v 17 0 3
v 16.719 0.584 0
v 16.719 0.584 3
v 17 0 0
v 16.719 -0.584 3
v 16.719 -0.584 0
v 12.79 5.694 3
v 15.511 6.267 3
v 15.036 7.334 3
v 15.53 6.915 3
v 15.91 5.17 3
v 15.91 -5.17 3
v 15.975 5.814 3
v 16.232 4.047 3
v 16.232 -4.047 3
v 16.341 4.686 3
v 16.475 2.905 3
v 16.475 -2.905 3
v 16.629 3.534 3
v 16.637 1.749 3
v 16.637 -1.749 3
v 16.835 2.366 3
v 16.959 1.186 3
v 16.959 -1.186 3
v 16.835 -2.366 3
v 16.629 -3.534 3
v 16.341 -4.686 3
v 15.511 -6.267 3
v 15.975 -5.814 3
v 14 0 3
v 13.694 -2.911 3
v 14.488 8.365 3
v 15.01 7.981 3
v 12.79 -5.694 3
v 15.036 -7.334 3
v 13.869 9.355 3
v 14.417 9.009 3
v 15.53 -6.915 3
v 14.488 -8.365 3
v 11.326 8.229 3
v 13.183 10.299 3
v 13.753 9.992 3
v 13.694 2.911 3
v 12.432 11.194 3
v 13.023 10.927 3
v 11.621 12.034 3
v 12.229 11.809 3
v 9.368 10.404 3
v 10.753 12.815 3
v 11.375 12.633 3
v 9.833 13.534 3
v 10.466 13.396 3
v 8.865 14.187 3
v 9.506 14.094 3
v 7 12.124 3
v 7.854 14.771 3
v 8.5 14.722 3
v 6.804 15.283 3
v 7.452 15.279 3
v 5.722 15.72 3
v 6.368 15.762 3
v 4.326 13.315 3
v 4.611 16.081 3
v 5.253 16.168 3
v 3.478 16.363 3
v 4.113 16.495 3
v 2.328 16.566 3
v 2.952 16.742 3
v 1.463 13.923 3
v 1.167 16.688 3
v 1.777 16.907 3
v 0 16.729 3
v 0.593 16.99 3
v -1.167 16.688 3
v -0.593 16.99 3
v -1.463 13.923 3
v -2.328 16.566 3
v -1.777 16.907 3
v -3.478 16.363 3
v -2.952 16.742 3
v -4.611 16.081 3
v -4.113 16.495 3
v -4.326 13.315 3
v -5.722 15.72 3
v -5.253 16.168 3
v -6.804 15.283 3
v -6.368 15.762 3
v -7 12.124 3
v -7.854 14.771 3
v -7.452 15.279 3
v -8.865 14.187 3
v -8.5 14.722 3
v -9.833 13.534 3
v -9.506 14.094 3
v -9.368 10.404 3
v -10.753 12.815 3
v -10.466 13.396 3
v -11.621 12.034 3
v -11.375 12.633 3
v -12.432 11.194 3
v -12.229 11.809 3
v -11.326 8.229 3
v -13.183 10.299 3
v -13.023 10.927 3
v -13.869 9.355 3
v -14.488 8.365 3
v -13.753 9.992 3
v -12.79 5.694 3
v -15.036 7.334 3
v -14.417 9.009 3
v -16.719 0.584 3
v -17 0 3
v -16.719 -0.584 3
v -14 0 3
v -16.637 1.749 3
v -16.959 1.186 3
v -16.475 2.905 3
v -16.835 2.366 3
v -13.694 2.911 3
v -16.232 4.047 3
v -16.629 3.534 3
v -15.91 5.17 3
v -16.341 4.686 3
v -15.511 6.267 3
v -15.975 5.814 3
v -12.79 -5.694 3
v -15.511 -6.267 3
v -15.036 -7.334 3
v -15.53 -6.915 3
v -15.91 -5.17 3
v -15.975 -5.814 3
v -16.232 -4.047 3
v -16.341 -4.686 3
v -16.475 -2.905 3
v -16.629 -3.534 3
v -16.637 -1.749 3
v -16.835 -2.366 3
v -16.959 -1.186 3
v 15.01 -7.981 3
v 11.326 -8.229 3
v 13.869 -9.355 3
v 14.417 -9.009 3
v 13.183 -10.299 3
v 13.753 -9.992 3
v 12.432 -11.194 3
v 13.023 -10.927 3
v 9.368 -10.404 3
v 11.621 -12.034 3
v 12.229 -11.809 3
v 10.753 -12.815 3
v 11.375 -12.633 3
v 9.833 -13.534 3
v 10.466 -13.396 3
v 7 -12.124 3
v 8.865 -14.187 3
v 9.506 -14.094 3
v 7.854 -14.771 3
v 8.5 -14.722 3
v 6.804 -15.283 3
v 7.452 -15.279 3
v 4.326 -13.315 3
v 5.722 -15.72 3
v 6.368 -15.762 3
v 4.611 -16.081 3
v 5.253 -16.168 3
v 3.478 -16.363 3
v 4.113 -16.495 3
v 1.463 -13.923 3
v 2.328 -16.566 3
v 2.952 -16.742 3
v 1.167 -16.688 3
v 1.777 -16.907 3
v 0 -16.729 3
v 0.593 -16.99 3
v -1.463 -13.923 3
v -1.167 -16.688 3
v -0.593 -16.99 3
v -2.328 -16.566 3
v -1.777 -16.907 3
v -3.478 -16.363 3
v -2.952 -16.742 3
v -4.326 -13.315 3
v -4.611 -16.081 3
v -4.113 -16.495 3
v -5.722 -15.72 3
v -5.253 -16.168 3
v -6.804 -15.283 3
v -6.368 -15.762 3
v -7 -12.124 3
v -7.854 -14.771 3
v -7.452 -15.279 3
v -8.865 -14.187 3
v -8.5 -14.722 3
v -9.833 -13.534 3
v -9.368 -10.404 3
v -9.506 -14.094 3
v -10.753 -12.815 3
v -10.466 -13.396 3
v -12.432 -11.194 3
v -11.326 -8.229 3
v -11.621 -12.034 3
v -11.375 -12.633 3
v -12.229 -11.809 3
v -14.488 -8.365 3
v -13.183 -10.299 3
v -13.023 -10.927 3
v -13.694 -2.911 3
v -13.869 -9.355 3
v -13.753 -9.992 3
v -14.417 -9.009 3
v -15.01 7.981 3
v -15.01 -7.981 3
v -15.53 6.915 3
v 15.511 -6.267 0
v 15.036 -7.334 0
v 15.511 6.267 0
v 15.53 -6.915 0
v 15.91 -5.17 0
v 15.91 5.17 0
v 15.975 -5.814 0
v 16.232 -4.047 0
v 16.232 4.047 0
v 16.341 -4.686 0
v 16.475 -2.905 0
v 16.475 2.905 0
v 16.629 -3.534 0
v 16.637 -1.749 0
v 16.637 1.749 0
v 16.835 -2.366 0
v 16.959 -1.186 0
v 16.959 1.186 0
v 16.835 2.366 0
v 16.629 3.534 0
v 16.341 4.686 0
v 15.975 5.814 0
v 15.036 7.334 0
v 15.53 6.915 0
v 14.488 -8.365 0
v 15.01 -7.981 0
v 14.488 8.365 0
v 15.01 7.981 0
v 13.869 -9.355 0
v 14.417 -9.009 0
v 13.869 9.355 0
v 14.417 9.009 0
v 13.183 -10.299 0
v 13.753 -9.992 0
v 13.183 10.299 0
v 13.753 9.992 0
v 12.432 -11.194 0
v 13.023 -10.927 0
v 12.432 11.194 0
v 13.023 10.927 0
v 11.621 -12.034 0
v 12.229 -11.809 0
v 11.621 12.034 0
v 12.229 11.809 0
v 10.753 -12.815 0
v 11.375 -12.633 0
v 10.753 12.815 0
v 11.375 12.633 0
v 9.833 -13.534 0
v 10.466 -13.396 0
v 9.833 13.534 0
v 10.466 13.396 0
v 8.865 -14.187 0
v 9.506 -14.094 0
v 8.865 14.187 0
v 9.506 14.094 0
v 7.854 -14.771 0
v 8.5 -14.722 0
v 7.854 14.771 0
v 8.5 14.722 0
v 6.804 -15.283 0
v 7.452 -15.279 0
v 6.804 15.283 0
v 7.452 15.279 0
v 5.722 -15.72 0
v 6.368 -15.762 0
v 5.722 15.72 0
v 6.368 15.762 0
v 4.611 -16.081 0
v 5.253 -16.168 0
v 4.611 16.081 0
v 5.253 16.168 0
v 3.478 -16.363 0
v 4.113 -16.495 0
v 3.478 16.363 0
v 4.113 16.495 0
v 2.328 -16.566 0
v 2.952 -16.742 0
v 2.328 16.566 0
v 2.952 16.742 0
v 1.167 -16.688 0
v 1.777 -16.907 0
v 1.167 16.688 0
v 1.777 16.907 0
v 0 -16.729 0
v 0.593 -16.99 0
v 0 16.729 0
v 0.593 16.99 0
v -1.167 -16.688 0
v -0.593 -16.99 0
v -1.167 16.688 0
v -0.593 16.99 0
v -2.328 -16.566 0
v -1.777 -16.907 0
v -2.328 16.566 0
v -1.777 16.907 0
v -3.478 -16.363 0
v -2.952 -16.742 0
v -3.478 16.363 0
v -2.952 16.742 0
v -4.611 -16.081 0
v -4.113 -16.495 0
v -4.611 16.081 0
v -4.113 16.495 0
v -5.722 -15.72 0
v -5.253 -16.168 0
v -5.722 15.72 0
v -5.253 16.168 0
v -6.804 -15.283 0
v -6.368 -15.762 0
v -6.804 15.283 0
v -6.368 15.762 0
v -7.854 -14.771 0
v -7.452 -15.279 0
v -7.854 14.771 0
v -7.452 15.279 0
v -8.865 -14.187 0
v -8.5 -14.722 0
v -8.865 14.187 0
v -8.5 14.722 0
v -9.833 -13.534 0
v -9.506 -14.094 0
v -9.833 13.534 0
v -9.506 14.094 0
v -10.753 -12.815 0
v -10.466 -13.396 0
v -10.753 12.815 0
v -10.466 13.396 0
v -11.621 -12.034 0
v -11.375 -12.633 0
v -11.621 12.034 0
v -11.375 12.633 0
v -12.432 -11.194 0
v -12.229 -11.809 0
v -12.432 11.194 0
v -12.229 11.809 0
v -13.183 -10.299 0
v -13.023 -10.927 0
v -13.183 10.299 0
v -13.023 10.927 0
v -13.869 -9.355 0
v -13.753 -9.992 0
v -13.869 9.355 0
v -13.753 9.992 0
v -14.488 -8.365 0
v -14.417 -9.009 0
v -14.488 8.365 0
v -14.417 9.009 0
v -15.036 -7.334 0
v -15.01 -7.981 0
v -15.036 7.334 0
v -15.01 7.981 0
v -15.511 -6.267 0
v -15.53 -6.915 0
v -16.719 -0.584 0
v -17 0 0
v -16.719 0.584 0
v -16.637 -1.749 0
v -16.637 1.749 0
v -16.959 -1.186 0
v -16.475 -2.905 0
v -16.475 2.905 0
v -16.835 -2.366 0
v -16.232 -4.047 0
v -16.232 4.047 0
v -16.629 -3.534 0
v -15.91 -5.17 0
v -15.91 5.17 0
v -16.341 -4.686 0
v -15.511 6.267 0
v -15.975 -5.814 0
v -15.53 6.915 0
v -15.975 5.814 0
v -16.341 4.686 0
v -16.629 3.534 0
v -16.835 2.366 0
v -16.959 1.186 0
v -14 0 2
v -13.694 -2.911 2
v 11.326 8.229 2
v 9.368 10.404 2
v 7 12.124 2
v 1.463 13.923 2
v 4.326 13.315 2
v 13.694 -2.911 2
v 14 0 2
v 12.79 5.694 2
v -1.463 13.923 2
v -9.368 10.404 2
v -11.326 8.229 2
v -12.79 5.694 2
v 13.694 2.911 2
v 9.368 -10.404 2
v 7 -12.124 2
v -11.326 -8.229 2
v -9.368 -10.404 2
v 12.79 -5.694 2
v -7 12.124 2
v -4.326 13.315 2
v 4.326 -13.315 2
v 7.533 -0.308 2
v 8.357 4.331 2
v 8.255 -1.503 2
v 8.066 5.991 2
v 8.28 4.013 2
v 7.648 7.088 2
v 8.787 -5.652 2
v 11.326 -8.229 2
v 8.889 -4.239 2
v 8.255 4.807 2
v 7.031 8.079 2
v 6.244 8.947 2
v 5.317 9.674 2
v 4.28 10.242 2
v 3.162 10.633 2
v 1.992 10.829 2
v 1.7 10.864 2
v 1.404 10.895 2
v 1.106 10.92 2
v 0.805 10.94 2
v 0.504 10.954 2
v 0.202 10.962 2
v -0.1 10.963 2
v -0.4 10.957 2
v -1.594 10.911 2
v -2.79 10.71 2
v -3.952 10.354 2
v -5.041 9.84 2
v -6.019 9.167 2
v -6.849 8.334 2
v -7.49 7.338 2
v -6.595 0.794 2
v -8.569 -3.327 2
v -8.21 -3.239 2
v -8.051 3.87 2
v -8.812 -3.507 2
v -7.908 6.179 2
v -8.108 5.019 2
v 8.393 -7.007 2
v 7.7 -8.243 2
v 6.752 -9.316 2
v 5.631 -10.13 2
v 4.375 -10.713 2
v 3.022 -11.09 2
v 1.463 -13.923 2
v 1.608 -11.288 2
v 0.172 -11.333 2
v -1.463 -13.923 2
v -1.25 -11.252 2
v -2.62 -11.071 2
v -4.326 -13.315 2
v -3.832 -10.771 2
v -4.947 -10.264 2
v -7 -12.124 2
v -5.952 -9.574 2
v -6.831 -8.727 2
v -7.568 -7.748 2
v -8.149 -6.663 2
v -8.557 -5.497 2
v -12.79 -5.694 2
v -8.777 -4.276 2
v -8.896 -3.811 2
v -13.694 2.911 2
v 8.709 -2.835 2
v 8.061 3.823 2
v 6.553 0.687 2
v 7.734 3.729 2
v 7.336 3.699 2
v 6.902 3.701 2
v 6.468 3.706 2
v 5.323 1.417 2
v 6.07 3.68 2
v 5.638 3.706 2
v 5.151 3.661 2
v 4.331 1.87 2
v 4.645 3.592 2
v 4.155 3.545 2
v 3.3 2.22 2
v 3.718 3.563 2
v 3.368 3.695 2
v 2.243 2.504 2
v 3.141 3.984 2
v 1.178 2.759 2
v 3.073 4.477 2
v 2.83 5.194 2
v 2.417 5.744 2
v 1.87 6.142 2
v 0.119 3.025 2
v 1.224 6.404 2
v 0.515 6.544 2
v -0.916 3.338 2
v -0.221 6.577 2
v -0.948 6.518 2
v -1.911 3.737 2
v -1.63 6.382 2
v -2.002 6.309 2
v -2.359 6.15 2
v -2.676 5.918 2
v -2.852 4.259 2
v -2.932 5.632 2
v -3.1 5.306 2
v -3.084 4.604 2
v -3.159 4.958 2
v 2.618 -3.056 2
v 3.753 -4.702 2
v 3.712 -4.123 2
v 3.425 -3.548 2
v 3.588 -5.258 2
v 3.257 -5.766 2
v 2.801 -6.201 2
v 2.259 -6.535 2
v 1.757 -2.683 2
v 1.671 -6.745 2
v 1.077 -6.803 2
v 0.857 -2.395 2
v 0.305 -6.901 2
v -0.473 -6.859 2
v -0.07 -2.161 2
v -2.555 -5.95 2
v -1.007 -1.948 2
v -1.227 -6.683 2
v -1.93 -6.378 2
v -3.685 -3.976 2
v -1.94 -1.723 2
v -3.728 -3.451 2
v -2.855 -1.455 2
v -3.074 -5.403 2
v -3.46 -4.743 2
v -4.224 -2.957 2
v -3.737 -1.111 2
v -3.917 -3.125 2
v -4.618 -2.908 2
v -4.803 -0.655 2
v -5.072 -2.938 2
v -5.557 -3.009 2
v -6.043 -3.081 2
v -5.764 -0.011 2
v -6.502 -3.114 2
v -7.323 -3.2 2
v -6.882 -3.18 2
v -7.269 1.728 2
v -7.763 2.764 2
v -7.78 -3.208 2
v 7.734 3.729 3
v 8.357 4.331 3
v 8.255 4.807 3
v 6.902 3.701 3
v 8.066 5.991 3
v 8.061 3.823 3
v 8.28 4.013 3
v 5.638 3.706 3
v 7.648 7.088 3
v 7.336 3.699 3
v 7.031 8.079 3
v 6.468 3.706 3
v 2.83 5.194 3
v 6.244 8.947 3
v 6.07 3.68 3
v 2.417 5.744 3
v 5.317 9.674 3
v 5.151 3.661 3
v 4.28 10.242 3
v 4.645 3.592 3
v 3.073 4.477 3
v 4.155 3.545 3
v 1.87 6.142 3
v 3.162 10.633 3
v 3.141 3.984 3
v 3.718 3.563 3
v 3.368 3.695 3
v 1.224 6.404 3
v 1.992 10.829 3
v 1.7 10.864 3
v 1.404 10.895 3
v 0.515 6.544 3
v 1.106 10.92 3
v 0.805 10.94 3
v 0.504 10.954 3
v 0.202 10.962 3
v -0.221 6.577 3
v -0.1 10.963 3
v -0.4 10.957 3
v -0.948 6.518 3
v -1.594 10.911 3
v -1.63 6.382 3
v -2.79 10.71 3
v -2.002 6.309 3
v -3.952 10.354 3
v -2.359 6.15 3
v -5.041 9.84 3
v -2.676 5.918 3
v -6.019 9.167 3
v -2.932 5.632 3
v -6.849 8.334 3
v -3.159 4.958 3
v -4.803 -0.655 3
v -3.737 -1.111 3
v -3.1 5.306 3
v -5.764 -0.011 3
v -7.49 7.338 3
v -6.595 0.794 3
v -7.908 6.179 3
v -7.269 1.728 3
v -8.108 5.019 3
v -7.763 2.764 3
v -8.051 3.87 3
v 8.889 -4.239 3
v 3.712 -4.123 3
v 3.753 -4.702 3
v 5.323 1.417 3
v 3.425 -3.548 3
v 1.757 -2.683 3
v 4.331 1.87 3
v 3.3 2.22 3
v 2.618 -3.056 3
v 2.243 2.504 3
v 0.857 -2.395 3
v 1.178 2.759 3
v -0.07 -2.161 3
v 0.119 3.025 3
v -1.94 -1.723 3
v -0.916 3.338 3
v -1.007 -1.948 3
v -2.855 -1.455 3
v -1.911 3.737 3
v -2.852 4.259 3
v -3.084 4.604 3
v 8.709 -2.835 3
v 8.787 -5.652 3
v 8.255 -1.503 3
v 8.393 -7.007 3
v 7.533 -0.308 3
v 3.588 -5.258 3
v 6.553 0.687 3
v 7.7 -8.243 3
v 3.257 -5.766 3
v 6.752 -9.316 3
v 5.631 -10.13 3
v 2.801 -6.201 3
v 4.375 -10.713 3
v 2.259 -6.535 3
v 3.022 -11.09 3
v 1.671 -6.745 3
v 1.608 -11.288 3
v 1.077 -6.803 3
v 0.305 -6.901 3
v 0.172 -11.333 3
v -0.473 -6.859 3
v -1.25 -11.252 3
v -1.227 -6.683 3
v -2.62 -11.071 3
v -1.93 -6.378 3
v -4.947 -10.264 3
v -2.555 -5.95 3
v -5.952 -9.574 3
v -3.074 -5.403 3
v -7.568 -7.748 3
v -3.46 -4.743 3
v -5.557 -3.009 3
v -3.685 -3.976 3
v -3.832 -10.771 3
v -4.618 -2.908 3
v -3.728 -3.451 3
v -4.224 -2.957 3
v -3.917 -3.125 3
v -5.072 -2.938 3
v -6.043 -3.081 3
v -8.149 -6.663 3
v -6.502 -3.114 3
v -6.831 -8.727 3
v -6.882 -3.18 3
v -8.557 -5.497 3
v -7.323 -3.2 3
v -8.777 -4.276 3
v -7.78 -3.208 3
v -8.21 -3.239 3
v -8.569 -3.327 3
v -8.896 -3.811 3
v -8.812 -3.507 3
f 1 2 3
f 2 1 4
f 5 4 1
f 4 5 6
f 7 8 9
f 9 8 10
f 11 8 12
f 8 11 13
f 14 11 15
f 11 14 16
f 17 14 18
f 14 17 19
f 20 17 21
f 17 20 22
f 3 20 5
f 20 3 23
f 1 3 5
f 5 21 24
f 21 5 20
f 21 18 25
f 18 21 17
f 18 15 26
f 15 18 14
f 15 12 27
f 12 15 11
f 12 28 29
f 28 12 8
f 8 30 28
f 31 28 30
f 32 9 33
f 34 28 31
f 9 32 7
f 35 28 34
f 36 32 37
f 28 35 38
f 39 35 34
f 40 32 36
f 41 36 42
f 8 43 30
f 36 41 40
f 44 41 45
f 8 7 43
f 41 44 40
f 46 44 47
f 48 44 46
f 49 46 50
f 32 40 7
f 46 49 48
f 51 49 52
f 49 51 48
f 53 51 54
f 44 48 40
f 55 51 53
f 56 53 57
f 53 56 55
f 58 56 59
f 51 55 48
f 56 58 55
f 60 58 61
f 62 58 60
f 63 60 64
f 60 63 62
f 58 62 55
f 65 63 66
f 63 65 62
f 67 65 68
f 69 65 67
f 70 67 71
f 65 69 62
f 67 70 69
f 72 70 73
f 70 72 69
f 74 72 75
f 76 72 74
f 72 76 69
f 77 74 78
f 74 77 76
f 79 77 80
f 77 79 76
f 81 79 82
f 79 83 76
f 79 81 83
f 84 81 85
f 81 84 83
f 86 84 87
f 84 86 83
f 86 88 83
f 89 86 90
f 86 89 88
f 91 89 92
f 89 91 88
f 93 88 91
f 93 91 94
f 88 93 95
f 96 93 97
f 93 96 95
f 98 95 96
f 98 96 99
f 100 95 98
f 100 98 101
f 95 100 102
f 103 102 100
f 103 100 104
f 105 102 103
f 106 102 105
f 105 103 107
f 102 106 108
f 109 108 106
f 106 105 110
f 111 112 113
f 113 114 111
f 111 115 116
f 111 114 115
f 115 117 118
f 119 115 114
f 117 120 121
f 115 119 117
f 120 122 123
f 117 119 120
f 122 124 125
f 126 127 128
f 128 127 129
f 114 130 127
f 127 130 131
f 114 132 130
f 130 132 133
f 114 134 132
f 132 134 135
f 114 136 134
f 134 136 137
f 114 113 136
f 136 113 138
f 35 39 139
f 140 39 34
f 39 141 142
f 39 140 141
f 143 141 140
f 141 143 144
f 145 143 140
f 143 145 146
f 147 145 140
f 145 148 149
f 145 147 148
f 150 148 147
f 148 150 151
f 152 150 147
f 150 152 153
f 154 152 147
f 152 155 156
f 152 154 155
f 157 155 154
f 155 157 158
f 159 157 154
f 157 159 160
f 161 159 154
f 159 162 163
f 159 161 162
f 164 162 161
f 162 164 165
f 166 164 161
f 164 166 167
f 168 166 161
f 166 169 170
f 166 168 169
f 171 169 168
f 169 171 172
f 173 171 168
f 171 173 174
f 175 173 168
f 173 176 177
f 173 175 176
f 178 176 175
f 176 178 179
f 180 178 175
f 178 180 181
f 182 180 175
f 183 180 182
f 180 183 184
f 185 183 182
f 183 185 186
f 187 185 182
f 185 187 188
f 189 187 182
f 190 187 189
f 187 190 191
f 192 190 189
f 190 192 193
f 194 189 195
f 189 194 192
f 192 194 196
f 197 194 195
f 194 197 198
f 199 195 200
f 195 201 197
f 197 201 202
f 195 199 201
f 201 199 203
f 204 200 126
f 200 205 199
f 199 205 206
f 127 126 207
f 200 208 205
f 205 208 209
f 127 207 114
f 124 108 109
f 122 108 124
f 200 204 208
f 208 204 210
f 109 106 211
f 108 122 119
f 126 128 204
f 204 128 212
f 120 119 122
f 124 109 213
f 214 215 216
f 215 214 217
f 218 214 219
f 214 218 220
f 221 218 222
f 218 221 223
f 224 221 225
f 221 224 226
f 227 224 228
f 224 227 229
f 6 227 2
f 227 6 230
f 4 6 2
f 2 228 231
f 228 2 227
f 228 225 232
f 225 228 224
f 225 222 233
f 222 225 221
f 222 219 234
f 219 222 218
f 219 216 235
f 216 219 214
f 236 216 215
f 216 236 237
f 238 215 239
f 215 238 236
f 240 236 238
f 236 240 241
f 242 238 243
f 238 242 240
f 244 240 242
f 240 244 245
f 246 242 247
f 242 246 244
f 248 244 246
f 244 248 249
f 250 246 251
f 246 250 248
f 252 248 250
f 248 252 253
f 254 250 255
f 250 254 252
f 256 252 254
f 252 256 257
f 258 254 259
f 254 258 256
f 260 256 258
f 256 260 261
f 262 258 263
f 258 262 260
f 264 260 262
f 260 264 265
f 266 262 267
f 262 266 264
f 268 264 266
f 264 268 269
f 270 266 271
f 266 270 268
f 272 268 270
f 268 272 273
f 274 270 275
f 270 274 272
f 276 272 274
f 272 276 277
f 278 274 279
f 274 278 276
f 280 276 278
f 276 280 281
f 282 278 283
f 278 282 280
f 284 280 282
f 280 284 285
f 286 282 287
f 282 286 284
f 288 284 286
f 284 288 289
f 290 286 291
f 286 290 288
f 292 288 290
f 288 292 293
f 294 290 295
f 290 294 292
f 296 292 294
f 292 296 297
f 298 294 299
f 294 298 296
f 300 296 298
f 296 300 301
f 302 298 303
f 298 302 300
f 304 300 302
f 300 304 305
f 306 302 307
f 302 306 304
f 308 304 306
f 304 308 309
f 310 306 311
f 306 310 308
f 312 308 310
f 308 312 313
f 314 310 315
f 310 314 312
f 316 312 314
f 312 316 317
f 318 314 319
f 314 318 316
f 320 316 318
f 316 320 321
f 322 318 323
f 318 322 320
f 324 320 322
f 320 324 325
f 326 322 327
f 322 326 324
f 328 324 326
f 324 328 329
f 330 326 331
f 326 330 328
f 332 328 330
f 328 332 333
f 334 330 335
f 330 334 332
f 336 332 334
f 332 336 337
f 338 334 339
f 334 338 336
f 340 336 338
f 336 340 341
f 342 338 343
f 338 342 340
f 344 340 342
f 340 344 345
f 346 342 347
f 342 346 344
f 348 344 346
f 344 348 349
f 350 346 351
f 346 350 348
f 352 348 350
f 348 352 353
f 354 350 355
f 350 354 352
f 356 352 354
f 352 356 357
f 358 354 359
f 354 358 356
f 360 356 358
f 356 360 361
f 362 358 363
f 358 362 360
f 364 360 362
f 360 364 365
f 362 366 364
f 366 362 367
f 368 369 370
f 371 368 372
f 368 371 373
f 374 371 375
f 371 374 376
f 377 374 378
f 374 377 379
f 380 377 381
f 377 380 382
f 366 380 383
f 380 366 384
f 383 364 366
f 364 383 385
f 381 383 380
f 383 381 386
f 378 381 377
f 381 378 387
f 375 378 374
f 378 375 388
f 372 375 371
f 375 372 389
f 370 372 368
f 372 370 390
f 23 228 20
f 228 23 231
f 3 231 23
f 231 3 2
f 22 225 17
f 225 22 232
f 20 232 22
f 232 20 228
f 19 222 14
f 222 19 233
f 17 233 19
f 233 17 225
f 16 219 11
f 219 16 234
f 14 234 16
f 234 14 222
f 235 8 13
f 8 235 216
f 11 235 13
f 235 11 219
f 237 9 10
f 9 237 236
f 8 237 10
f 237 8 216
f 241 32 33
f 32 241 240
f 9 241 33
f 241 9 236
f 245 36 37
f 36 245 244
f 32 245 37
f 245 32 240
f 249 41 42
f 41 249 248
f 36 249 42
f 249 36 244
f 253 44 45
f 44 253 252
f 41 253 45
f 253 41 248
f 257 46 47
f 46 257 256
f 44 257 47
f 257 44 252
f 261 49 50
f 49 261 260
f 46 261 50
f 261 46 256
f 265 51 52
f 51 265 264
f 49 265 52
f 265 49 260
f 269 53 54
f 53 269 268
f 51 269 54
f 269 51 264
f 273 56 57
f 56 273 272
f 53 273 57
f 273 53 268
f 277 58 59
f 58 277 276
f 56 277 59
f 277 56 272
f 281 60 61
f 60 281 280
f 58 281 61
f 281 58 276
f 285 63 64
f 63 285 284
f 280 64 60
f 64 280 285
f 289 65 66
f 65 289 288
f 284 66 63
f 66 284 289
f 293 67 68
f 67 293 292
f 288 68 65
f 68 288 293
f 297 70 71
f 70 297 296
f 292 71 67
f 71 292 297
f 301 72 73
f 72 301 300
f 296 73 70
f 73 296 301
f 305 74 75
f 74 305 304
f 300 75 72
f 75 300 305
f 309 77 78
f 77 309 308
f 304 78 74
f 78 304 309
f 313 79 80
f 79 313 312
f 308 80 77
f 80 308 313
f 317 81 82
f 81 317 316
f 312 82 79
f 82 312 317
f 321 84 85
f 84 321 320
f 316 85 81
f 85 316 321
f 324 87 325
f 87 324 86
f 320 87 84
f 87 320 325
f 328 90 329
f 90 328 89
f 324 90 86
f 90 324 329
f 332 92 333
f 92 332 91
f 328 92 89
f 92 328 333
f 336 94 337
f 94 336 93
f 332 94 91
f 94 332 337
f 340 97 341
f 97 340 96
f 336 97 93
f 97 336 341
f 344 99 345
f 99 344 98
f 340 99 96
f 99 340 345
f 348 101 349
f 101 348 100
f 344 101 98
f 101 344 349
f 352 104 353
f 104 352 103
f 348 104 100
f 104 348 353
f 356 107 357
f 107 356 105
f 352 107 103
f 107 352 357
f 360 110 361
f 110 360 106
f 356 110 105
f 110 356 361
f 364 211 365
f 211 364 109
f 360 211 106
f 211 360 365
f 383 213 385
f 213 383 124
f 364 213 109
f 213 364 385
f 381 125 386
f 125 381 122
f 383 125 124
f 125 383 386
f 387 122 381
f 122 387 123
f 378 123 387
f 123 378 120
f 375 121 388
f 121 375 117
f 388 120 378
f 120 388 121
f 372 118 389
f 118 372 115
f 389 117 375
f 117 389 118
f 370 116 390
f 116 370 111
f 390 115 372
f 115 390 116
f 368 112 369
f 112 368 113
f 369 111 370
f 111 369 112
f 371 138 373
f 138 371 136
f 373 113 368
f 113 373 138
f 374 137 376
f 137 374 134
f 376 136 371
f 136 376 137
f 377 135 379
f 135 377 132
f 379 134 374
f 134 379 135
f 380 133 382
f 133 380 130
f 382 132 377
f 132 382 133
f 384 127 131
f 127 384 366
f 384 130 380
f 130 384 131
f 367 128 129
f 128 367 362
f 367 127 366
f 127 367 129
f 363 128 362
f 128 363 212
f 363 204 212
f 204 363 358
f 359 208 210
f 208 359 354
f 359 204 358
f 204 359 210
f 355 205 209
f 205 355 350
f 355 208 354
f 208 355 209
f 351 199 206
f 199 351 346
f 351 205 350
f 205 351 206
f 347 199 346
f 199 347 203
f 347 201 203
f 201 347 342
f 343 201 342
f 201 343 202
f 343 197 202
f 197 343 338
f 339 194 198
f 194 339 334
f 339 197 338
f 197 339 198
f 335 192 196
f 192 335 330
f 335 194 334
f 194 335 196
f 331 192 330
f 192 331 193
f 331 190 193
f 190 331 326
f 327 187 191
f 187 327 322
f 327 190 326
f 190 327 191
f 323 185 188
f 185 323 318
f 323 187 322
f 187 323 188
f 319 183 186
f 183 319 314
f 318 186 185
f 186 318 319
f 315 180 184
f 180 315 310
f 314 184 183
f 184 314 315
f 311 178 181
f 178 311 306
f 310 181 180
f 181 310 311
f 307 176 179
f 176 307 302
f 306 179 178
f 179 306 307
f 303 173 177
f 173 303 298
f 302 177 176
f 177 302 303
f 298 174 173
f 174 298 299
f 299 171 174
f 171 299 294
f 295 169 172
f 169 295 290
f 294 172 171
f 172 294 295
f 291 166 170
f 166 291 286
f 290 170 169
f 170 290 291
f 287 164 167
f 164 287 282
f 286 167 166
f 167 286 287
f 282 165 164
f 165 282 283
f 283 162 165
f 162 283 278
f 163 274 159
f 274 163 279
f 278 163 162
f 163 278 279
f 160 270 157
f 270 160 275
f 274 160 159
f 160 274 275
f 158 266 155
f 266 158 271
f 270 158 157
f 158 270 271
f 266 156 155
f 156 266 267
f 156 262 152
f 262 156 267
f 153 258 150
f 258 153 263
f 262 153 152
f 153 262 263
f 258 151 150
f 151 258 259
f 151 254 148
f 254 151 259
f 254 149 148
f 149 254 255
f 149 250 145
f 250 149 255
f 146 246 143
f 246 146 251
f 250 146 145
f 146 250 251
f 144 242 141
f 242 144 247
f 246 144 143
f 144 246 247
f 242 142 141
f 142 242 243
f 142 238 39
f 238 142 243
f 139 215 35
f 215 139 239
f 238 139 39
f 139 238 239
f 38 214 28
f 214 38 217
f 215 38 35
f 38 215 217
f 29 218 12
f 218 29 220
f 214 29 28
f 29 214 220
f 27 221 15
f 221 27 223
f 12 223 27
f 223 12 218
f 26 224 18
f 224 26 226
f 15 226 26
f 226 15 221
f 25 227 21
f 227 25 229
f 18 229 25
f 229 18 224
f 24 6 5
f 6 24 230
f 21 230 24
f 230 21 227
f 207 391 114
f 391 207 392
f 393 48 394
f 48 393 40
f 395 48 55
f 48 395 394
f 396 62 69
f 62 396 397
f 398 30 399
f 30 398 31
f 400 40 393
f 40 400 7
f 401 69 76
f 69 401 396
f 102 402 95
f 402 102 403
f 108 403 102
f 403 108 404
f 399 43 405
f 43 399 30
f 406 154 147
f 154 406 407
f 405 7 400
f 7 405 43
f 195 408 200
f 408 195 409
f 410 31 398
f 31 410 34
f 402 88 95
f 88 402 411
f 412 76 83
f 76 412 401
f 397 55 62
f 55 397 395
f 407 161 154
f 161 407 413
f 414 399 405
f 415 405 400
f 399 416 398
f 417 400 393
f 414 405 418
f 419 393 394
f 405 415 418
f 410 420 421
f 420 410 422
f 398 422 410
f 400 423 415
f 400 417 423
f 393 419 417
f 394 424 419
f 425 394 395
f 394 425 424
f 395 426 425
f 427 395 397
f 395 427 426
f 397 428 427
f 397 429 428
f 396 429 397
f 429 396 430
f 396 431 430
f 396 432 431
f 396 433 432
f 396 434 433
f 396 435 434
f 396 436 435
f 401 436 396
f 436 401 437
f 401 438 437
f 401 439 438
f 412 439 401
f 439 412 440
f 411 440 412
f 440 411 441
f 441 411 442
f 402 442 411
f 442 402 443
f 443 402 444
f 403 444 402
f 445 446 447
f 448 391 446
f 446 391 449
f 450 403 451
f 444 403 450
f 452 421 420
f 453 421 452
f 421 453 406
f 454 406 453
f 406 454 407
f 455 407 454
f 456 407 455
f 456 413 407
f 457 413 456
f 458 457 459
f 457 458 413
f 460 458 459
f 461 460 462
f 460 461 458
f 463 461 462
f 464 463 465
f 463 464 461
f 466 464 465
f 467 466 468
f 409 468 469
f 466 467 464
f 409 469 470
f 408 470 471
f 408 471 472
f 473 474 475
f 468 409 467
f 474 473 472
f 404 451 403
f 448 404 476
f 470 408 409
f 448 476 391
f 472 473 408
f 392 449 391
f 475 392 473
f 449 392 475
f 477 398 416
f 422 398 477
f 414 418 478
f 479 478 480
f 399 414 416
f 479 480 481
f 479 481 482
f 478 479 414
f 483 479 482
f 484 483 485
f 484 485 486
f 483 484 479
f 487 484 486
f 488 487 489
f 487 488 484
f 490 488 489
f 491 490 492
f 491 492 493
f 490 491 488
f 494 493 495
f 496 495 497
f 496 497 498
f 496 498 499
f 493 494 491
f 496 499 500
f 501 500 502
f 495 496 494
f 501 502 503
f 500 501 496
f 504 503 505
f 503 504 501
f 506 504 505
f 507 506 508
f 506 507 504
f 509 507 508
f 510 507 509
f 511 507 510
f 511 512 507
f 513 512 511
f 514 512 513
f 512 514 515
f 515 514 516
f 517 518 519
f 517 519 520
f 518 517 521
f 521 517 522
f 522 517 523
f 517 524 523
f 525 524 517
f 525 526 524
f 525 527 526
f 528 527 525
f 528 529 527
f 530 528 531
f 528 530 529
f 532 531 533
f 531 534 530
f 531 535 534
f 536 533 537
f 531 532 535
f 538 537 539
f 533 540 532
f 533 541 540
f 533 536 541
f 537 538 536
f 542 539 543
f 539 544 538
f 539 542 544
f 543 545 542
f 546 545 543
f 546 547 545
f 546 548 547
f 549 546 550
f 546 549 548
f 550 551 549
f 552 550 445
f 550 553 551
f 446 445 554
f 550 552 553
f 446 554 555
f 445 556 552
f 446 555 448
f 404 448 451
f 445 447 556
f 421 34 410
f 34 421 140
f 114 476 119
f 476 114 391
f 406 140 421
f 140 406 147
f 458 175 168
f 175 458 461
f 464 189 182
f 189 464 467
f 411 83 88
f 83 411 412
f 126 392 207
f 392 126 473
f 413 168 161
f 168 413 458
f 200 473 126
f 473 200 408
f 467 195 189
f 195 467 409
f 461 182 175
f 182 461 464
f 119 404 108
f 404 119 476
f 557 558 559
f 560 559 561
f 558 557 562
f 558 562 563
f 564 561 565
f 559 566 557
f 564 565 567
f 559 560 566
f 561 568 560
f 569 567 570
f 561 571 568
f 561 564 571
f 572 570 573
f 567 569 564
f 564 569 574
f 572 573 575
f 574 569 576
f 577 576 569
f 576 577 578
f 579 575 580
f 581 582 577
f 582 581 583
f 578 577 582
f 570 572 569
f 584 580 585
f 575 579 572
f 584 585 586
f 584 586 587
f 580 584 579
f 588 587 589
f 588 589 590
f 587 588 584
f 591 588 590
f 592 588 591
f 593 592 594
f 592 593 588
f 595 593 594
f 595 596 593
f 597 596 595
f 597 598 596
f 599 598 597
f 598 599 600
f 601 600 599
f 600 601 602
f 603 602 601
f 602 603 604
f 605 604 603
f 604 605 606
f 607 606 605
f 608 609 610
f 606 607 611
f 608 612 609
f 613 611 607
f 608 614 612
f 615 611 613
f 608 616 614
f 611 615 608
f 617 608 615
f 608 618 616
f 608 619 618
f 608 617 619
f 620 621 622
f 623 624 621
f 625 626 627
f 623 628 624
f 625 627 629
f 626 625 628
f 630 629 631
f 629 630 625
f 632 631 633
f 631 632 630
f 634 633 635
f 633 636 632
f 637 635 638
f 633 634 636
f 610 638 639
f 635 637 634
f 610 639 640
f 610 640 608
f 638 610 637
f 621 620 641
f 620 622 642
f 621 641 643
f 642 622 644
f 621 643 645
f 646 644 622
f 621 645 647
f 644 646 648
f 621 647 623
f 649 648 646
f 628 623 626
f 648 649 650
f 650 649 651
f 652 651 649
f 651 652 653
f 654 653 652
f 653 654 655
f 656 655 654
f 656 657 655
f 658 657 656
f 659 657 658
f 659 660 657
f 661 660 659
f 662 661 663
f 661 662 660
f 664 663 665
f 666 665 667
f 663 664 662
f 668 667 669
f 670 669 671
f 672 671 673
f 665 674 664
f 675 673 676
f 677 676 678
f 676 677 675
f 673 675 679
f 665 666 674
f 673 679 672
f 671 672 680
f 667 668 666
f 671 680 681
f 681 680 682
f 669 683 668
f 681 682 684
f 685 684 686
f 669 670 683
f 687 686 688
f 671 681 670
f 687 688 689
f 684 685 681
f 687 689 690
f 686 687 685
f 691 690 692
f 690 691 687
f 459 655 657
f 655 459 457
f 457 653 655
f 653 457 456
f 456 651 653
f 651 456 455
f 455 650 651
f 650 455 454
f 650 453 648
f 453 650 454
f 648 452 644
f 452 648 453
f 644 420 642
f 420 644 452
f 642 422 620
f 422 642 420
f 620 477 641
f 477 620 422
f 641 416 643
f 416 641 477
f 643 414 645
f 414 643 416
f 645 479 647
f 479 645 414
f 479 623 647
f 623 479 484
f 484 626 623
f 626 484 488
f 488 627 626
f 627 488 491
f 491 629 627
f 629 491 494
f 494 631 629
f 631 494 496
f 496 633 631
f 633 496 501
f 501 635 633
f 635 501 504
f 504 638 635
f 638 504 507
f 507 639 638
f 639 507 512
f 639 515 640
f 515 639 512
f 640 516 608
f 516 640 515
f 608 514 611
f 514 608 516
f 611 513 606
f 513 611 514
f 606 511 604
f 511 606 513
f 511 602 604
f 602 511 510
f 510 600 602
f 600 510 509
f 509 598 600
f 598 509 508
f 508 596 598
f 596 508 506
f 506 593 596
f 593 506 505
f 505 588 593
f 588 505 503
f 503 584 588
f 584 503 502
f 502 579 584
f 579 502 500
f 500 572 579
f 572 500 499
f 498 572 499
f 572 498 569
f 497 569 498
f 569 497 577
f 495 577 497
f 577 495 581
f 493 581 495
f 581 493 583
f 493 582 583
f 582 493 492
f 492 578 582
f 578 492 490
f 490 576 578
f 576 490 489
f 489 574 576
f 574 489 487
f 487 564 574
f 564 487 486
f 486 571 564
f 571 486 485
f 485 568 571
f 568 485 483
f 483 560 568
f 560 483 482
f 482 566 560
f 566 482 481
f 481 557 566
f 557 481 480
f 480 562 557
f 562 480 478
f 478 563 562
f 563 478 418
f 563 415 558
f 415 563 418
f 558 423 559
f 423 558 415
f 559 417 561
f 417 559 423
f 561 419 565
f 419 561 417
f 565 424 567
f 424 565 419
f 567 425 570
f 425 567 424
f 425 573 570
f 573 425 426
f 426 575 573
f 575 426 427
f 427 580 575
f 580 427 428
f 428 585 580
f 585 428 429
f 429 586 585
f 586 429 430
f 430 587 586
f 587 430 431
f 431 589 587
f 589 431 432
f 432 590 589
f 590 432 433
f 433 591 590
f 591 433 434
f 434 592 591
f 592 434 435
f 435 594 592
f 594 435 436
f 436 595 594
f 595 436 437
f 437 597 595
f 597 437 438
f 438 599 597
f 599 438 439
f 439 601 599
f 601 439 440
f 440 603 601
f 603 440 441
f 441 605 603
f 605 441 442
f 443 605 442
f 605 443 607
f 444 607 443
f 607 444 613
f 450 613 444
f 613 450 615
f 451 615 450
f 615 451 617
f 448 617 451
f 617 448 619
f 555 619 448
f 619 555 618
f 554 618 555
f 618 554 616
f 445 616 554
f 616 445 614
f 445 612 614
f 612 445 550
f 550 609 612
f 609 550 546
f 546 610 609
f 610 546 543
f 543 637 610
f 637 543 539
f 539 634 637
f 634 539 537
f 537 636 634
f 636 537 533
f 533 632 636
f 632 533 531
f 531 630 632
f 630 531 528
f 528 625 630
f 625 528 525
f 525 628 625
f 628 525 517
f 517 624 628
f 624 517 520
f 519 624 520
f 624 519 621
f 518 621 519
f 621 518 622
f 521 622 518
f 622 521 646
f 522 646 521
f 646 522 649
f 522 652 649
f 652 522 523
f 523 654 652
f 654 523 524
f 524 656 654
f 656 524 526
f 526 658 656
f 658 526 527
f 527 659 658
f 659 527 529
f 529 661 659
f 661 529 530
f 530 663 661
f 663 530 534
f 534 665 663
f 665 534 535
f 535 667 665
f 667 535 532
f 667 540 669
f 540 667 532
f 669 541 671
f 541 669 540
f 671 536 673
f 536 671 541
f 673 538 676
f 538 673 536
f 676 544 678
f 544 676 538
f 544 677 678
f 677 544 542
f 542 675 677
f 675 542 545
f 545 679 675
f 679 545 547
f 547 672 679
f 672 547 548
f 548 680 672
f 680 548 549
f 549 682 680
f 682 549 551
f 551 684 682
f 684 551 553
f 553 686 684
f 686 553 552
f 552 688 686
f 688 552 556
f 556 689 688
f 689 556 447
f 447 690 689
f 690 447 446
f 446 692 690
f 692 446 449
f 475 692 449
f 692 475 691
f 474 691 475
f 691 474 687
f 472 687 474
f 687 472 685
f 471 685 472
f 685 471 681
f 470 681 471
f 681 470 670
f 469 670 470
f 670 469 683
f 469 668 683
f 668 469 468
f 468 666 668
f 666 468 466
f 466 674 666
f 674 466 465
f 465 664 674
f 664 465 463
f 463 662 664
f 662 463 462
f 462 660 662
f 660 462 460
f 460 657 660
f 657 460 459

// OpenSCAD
// file: coin-lib.scad
/*
 * Simple coin shape
 *
 * Copyright (c) 2012 Mark Hindess
 *
 * Creative Commons Attribution-NonCommercial-ShareAlike 3.0 Unported License:
 *
 *   http://creativecommons.org/licenses/by-nc-sa/3.0/
 */

module coin(height = 3, radius = 17,
            cut_radius = 14, cut_height = 1,
            bumps = 90, bump_radius = 2) {
  deg = 360/bumps;
  difference() {
    union() {
      for(n=[0:bumps-1]) {
        rotate([0, 0, n*deg])
          translate([radius-bump_radius, 0, 0])
            cylinder(r = bump_radius, h = height);
      }
      cylinder(r = radius-bump_radius, h = height);
    }
    translate([0, 0, height-cut_height])
      cylinder(r = cut_radius, h = height-cut_height);
  }
}

coin();
// main file
use <coin-lib.scad>
coin();
translate([-13,-12.8,2])
  scale([0.3,0.3,1])
    linear_extrude(file = "s.dxf", height = 2, center = true);
